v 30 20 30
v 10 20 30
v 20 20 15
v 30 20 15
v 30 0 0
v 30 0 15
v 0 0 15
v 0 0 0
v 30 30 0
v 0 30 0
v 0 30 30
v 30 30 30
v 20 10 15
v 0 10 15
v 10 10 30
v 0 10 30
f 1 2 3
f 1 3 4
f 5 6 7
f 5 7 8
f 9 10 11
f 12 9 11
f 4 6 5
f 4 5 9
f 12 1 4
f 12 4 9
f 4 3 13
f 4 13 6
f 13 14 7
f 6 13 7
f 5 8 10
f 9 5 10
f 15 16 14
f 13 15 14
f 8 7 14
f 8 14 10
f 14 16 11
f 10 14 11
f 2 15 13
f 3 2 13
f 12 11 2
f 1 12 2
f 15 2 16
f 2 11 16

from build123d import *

# Parameters (mm, degrees)
F1_DEPTH = 30
F3_DEPTH = 10


with BuildPart() as f1:
    # F0 (on Right) → F1 (new body)
    with BuildSketch(Plane.YZ):
        Polygon((0, 15), (0, 0), (30, 0), (30, 30), (10, 30), (10, 15), align=None)
    extrude(amount=F1_DEPTH)

    # F2 (on face) → F3 (cut)
    with BuildSketch(Plane.XZ.offset(-10)):
        Polygon((30, 15), (30, 30), (10, 30), (20, 15), align=None)
    extrude(amount=-F3_DEPTH, mode=Mode.SUBTRACT)


solid = f1.part
